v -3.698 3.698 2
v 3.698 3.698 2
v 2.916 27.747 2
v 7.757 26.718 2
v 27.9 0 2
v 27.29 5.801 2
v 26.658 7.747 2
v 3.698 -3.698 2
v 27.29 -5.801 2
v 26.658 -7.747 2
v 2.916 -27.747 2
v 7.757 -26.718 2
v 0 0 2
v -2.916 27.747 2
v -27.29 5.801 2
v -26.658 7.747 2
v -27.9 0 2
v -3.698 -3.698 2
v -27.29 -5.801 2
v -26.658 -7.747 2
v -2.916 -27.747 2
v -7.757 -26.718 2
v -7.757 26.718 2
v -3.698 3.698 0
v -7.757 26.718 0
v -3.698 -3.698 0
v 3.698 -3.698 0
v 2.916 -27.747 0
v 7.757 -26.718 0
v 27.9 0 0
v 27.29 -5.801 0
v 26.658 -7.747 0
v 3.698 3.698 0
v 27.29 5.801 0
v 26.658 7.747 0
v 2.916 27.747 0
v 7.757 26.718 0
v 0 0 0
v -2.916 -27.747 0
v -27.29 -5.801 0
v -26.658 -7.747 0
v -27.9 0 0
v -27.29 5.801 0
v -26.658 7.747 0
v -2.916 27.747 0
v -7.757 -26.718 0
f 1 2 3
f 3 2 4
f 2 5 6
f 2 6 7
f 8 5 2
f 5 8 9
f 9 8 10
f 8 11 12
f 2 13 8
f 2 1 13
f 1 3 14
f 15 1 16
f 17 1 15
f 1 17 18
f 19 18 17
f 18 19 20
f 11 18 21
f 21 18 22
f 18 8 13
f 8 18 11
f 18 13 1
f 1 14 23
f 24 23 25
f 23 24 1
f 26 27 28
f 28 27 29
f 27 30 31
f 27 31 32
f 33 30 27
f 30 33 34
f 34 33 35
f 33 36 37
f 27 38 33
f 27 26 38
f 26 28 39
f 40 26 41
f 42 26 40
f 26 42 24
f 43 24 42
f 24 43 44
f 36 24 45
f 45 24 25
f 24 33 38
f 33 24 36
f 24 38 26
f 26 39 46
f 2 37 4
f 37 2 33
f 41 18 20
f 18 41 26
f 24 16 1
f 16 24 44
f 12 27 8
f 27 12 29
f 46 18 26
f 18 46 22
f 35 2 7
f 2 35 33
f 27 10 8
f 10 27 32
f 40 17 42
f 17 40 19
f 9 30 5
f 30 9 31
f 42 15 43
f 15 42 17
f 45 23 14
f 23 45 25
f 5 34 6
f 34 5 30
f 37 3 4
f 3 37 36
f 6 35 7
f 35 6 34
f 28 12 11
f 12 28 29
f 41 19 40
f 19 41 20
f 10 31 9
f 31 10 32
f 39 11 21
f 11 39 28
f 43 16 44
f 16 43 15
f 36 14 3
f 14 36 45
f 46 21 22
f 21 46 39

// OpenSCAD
//cylinder(r=30,h=5,$fn=8);

r=30;

// difference() {
//   cross(6);
//   translate([0,0,-1]) cylinder(r=r-2,h=5);
// }


intersection() {
  cross(2);
  translate([0,0,-1]) cylinder(r=r-2.1,h=5);
}


module cross(t) {
  arm(t);
  rotate([0,0,90]) arm(t);
  rotate([0,0,180]) arm(t);
  rotate([0,0,270]) arm(t);
}


module arm(t) {
  w=30;
  o=3;
  intersection() {
    rotate([0,0,10]) translate([-o,0,0]) cube([w,r,t]);
    rotate([0,0,-10]) translate([-w+o,0,0]) cube([w,r,t]);
  }
}
